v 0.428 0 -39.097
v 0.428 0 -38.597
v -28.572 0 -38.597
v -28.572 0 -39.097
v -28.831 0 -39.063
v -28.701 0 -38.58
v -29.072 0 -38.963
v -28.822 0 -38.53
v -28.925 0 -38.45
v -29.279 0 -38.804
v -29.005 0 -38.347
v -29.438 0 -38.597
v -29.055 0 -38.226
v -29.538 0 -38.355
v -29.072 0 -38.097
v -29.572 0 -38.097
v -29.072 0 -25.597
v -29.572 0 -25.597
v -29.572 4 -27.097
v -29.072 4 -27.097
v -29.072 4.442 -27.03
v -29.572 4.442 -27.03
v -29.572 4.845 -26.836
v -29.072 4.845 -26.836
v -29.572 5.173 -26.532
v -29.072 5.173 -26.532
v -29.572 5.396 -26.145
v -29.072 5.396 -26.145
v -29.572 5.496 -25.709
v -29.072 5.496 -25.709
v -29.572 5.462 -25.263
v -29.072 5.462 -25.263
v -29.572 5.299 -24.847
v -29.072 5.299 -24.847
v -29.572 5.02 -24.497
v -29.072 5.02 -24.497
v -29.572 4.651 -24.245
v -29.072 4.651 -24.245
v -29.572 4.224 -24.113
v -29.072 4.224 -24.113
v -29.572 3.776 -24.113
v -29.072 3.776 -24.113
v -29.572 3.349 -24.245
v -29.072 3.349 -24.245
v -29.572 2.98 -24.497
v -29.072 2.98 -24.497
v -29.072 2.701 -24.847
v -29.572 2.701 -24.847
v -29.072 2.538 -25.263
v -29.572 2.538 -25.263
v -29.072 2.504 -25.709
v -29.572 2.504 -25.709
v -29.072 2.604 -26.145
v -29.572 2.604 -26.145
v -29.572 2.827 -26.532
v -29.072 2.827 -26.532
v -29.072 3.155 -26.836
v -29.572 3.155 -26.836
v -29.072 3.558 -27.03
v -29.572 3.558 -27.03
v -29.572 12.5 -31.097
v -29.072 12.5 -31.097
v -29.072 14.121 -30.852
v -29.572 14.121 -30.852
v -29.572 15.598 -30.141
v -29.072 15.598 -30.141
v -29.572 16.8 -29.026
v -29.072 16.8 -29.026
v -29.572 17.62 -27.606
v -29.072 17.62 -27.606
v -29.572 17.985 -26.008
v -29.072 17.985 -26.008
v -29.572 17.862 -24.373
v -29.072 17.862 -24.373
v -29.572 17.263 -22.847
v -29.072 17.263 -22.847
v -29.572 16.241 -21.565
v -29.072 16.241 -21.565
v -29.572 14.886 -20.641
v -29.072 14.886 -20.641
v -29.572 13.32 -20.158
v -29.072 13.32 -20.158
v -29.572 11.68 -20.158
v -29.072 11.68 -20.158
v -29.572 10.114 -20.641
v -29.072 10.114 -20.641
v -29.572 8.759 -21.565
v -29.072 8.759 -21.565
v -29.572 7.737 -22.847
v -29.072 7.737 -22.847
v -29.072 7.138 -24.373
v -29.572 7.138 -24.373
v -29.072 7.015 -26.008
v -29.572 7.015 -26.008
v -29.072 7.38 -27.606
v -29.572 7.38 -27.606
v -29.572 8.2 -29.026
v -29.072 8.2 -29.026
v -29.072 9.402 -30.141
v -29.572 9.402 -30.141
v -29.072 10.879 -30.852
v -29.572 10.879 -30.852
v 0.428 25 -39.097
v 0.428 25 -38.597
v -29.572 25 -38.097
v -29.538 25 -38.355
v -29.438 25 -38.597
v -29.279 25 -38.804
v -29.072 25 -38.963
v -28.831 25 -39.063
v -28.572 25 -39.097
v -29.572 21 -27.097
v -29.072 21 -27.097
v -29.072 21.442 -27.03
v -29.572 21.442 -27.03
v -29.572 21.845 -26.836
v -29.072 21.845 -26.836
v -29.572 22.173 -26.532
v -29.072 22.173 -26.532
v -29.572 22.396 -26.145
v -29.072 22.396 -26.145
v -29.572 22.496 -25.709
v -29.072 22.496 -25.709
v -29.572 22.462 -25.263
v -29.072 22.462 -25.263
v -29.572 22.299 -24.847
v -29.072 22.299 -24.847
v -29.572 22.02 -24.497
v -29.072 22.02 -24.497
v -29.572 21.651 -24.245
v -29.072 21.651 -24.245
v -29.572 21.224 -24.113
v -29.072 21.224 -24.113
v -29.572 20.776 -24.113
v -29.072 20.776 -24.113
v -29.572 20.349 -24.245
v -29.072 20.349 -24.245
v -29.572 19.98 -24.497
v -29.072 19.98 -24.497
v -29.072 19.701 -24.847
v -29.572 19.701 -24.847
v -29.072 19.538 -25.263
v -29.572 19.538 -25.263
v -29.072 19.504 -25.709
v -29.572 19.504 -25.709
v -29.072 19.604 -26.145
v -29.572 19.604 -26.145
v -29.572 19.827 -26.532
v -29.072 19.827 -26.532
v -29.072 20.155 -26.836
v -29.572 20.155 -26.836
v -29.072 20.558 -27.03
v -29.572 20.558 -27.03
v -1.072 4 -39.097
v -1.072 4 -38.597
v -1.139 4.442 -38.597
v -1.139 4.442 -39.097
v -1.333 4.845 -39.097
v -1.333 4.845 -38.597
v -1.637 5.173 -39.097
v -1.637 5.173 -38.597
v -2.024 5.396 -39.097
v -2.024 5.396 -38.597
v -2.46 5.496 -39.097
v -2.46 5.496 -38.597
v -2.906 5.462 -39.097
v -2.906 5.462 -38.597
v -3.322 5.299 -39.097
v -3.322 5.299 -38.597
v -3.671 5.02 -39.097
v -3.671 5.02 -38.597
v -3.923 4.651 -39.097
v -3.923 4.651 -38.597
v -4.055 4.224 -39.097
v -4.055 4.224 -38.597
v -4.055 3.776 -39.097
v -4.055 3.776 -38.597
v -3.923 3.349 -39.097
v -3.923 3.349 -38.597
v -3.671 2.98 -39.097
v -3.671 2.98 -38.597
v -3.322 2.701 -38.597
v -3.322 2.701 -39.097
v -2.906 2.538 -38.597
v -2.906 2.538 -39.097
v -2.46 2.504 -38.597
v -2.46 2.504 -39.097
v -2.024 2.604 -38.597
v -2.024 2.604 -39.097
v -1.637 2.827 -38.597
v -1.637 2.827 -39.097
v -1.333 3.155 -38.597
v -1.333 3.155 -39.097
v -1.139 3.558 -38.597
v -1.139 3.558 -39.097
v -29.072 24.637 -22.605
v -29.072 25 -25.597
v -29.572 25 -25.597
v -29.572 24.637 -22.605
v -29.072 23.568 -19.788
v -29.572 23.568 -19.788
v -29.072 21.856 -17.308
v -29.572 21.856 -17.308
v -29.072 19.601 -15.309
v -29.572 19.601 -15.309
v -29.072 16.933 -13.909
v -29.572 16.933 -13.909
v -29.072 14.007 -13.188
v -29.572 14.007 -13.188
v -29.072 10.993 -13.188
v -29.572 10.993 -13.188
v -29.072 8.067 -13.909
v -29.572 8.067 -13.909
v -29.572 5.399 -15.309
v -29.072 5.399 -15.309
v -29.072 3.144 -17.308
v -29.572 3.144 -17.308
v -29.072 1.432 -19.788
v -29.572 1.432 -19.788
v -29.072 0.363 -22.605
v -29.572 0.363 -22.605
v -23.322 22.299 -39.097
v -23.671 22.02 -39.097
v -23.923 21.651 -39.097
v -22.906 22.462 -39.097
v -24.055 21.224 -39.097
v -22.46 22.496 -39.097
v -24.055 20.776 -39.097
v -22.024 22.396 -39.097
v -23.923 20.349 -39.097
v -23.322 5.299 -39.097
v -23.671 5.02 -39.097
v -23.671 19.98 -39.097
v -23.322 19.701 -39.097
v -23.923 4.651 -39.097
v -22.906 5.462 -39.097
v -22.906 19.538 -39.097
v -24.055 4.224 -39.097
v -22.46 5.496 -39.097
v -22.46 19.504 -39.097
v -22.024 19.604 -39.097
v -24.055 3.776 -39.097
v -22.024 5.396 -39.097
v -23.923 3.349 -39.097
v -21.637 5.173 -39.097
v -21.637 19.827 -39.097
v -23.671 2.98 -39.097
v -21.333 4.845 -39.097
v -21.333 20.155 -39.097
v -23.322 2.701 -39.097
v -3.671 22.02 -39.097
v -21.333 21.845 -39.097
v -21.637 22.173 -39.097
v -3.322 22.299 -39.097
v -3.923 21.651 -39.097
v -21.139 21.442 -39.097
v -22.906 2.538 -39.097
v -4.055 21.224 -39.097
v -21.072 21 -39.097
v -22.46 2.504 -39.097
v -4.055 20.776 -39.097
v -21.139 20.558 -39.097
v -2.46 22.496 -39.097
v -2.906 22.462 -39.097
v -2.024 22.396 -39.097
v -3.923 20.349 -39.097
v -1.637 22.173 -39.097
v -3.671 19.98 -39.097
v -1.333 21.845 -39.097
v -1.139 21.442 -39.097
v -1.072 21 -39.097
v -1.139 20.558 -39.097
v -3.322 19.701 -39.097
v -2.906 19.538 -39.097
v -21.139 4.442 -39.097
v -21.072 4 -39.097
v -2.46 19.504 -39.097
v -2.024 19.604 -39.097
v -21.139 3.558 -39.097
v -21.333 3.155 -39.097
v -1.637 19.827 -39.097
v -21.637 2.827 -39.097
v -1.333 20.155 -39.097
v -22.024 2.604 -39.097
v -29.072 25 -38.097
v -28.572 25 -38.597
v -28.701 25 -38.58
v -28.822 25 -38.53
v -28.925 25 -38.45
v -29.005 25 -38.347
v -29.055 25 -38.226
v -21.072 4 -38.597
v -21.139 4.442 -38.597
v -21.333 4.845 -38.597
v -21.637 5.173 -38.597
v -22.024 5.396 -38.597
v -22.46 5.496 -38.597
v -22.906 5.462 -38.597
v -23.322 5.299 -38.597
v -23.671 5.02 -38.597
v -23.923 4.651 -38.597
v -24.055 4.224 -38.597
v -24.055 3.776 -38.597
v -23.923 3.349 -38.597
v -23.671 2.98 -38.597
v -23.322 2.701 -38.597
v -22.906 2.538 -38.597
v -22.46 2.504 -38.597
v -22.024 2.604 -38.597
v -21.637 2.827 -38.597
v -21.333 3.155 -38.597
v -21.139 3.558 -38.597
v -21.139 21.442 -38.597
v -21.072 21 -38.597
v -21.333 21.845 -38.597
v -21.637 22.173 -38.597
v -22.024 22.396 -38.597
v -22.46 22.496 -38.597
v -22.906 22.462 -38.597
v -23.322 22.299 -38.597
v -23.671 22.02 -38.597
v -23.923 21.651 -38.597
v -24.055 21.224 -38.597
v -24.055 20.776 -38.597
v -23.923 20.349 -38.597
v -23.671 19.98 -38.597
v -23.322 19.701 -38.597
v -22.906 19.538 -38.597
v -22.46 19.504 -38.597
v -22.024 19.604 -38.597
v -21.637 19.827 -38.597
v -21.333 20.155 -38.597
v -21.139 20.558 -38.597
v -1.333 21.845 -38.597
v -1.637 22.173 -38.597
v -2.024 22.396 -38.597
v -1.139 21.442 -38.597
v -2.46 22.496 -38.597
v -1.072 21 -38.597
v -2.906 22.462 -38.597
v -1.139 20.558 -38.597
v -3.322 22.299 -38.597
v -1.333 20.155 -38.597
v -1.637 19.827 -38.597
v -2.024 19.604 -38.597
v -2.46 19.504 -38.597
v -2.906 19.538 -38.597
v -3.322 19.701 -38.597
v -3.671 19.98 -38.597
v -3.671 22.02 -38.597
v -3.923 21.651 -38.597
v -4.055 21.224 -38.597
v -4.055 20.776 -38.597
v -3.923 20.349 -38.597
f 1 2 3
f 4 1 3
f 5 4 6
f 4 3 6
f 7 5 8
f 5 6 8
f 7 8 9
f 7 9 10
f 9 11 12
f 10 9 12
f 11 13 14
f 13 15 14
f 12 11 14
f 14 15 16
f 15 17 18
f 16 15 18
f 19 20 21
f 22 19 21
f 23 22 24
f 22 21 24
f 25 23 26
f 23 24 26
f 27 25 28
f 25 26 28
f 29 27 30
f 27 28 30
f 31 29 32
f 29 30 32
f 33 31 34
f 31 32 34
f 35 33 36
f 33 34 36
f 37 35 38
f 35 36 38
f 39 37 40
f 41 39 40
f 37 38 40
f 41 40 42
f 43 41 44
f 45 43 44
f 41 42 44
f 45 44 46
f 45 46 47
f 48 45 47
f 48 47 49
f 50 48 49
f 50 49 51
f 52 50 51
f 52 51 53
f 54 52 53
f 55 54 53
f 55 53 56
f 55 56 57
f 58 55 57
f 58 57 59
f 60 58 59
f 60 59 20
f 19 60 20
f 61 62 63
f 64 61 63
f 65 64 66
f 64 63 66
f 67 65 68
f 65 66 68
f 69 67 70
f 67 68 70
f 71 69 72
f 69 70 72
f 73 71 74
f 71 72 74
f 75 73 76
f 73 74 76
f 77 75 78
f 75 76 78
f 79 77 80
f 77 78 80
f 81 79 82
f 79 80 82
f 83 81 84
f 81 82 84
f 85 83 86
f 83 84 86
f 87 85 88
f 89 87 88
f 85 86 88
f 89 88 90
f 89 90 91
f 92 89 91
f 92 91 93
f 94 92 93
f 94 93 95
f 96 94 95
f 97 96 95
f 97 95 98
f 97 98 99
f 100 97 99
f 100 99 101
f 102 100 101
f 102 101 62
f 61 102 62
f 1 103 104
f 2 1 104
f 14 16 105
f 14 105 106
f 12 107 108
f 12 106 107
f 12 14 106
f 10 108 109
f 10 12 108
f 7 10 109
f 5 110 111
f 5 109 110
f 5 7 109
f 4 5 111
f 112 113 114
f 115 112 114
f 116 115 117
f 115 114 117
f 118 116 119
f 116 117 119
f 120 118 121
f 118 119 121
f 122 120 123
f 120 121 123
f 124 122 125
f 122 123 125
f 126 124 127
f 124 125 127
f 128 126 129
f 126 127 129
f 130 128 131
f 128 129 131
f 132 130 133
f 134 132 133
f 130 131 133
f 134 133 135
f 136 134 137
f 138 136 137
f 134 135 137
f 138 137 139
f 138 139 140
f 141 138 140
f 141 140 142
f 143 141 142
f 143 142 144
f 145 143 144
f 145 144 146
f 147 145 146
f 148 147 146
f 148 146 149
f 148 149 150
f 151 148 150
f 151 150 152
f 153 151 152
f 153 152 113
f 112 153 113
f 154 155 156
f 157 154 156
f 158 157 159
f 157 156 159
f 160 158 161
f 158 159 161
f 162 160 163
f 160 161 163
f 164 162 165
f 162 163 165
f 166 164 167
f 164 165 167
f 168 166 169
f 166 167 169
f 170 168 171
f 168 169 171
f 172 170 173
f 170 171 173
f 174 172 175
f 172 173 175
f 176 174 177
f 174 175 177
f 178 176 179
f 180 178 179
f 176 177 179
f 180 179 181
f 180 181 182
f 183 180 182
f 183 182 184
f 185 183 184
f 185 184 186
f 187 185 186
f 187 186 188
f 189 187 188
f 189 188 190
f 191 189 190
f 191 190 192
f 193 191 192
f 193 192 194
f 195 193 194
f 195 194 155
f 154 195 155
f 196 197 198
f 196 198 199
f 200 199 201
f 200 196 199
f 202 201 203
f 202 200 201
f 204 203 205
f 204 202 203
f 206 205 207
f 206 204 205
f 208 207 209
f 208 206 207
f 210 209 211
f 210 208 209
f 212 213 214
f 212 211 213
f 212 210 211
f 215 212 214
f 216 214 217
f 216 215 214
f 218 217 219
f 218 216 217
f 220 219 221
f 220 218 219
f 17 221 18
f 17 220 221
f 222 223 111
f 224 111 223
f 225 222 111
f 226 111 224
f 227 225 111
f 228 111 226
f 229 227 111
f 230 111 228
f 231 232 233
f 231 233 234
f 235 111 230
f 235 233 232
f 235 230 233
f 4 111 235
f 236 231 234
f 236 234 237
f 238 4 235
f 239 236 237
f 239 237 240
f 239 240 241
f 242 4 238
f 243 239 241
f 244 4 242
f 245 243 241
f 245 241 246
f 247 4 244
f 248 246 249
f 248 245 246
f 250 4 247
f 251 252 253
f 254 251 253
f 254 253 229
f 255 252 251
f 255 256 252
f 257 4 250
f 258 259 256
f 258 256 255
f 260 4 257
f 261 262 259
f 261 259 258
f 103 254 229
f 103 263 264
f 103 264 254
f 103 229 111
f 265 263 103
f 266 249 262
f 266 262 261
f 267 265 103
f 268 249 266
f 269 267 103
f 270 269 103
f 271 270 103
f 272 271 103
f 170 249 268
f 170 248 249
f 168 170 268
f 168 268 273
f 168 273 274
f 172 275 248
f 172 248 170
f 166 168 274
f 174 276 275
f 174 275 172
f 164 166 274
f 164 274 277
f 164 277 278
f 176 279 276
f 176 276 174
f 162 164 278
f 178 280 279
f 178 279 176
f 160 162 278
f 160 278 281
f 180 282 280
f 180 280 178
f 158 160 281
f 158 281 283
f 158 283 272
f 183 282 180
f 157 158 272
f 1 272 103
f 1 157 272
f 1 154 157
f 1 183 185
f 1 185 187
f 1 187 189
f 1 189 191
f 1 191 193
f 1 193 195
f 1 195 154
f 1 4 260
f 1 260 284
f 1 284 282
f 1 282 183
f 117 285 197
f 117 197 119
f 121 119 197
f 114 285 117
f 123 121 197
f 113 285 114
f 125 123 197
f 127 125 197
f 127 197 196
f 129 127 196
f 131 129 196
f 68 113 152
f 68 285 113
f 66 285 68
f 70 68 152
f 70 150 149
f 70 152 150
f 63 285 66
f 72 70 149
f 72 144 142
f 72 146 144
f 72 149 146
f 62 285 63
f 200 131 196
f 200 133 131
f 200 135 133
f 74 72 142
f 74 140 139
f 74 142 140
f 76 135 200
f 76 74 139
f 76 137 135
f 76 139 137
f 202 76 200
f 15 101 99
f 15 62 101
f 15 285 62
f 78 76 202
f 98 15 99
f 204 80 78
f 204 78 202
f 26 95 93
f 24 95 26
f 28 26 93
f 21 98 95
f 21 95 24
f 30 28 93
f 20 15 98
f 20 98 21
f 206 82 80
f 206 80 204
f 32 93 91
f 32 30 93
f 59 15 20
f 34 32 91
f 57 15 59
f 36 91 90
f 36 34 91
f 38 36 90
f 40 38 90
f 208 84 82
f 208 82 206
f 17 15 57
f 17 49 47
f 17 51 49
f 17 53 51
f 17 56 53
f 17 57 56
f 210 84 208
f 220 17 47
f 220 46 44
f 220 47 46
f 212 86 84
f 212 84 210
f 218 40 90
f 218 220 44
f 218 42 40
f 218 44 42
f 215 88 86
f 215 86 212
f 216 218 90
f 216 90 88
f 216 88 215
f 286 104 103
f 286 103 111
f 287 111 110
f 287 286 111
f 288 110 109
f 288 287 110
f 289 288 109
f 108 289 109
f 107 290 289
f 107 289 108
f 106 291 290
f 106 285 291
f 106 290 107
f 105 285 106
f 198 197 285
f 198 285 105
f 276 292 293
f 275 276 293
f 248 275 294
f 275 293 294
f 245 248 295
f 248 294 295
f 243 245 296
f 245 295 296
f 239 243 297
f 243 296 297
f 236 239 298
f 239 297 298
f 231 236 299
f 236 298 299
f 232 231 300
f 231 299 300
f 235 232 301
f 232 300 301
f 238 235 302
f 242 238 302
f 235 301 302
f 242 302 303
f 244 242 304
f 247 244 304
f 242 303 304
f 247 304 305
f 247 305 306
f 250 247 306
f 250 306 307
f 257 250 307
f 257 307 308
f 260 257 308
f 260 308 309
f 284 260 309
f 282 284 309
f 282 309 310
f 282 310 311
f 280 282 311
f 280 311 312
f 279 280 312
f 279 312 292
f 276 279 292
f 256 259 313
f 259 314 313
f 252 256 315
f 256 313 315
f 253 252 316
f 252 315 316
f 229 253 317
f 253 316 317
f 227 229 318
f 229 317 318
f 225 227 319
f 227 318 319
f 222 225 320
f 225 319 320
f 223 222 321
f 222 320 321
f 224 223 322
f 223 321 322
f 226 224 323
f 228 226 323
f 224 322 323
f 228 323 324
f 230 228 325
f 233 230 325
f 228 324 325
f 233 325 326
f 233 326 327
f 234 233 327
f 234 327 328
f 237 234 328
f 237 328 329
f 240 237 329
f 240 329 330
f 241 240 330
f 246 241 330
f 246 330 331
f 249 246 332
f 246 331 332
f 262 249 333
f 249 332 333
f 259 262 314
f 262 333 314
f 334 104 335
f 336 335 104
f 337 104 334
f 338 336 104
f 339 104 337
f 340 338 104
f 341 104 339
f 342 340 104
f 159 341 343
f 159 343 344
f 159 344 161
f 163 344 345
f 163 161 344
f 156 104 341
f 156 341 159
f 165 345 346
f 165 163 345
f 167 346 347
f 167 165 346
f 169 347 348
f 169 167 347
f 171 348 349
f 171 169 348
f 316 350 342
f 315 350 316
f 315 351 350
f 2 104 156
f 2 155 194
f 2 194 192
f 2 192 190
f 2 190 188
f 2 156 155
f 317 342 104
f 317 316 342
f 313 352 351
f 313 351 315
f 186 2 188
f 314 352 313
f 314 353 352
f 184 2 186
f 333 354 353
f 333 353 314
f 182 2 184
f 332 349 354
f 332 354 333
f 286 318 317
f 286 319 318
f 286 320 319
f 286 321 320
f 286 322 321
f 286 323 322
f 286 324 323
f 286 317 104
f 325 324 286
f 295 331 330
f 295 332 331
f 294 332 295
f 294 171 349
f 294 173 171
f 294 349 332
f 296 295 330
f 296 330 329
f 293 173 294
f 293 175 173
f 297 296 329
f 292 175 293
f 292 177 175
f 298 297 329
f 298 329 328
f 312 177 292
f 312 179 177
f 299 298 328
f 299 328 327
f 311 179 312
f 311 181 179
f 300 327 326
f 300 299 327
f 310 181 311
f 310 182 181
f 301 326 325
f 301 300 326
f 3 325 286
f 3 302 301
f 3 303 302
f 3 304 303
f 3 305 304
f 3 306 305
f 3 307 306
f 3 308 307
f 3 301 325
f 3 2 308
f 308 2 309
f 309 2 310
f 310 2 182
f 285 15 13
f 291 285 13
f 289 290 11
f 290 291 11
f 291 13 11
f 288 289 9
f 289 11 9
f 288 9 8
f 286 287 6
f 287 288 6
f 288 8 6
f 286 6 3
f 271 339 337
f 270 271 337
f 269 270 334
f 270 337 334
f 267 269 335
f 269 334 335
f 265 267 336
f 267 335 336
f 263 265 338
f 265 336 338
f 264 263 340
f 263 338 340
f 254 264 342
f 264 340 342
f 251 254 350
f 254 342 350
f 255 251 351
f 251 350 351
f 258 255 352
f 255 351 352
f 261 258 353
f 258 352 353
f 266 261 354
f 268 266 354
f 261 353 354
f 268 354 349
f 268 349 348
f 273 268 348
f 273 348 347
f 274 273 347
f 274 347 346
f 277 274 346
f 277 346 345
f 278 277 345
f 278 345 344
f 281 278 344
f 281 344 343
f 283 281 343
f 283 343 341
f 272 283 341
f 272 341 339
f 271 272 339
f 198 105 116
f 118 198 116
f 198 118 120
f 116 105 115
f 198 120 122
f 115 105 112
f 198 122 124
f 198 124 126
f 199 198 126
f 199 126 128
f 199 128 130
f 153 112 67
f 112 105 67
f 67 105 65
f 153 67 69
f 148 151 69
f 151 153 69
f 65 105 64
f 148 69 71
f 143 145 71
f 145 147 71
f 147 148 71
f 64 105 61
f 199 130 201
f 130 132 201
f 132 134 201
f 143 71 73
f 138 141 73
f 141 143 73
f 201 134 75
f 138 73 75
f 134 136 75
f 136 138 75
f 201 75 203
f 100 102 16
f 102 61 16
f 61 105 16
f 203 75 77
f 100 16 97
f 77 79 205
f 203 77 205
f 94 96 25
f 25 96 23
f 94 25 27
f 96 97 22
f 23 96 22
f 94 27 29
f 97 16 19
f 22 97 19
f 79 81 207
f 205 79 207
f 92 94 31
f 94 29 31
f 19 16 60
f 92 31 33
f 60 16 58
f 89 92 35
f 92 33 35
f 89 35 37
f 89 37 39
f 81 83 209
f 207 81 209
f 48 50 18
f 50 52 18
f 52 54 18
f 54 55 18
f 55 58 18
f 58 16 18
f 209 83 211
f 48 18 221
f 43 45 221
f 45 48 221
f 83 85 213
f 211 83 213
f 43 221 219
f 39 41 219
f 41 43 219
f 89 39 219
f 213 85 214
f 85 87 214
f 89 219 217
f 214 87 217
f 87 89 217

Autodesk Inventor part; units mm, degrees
ref_plane "YZ Plane" through (0, 0, 0) normal (1, 0, 0) x (0, 1, 0)
ref_plane "XZ Plane" through (0, 0, 0) normal (0, 1, 0) x (-1, 0, 0)
ref_plane "XY Plane" through (0, 0, 0) normal (0, 0, 1) x (1, 0, 0)
sketch "草圖1" plane through (0, 0, 0) normal (0, 1, 0) x (-1, 0, 0)
  line L0 (29.5719, -39.0966) -> (29.5719, -13.0966)
  line L1 (29.5719, -39.0966) -> (-0.4281, -39.0966)
  point P0 (0, 0)
  dimension "d0" = 26
  dimension "d2" = 90
  dimension "d3" = 30
contour flange "輪廓線凸緣1" sketch "草圖1" thickness 0.5 bend radius 0.5 width 25 along (0, 1, 0) mid plane no both sides no wall seen from (-29.5719, 0, -26.0966) lies toward (1, 0, 0) curves L0 L1
bend "折彎1"
corner "轉角1"
sketch "草圖2" plane through (-29.0719, 0, -13.0966) normal (1, 0, 0) x (0, 0, -1)
  circle A0 centre (12.5, 12.5) radius 12.5
  line L0 (0, 25) -> (25, 25) projected
  line L1 (0, 0) -> (0, 25) projected
  line L2 (0, 0) -> (25, 0) projected
  point P0 (-13.0966, 0)
  point P1 (0, 12.5)
  point P2 (12.5, 25)
  point P3 (12.5, 0)
  dimension "d15" = 25
extrude "擠出1" cut sketch "草圖2" against normal up to surface (0.5 mm away) contours A0 L1 L0 | L2 L1 A0
sketch "草圖3" plane through (-29.0719, 0, -38.0966) normal (1, 0, 0) x (0, 0, -1)
  arc A0 (-12.5, 25) -> (-12.5, 0) centre (-12.5, 12.5) ccw projected
  circle A1 centre (-12.5, 21) radius 1.5
  circle A2 centre (-12.5, 4) radius 1.5
  point P0 (-38.0966, 0)
  dimension "d18" = 3
  dimension "d19" = 17
  dimension "d20" = 8.5
  dimension "d21" = 3
extrude "擠出2" cut sketch "草圖3" against normal up to surface (0.5 mm away)
sketch "草圖4" plane through (0.4281, 0, -38.5966) normal (0, 0, 1) x (1, 0, 0)
  circle A0 centre (-23, 21) radius 1.5
  circle A1 centre (-3, 21) radius 1.5
  circle A2 centre (-23, 4) radius 1.5
  circle A3 centre (-3, 4) radius 1.5
  line L0 (0, 0) -> (0, 25) projected
  line L1 (-3, 21) -> (-3, 4)
  line L2 (-3, 12.5) -> (-13.1347, 12.5)
  line L3 (-29, 25) -> (0, 25) projected
  point P0 (-0.4281, 0)
  dimension "d24" = 20
  dimension "d25" = 3
  dimension "d26" = 3
  dimension "d27" = 3
  dimension "d28" = 3
  dimension "d29" = 17
  dimension "d30" = 3
  dimension "d31" = 12.5
extrude "擠出3" cut sketch "草圖4" against normal up to surface (0.5 mm away)
sketch "草圖5" plane through (-29.0719, 0, -38.0966) normal (1, 0, 0) x (0, 0, -1)
  arc A0 (-12.5, 25) -> (-12.5, 0) centre (-12.5, 12.5) ccw projected
  circle A1 centre (-12.5, 12.5) radius 5.5
  point P0 (-38.0966, 0)
  dimension "d34" = 11
extrude "擠出4" cut sketch "草圖5" against normal up to surface (0.5 mm away)
equation "\"d4\" = 厚度"
equation "\"d5\" = 折彎離隙寬度"
equation "\"d6\" = 折彎離隙深度"
equation "\"d7\" = 最小剩餘"
equation "\"d8\" = 轉移半徑"
equation "\"d10\" = 折彎半徑"
equation "\"d12\" = 轉角離隙大小"
equation "\"d13\" = 間隙大小"
equation "\"d14\" = Jacobi半徑大小"
equation "\"折彎半徑\" = 厚度"
equation "\"折彎離隙寬度\" = 厚度"
equation "\"折彎離隙深度\" = 0.5 * 厚度"
equation "\"轉角離隙大小\" = 4 * 厚度"
equation "\"最小剩餘\" = 2 * 厚度"
equation "\"轉移半徑\" = 折彎半徑"
equation "\"Jacobi半徑大小\" = 折彎半徑"
equation "\"間隙大小\" = 厚度"
equation "\"厚度\" = 0.5"
properties part number "wheel_base"
